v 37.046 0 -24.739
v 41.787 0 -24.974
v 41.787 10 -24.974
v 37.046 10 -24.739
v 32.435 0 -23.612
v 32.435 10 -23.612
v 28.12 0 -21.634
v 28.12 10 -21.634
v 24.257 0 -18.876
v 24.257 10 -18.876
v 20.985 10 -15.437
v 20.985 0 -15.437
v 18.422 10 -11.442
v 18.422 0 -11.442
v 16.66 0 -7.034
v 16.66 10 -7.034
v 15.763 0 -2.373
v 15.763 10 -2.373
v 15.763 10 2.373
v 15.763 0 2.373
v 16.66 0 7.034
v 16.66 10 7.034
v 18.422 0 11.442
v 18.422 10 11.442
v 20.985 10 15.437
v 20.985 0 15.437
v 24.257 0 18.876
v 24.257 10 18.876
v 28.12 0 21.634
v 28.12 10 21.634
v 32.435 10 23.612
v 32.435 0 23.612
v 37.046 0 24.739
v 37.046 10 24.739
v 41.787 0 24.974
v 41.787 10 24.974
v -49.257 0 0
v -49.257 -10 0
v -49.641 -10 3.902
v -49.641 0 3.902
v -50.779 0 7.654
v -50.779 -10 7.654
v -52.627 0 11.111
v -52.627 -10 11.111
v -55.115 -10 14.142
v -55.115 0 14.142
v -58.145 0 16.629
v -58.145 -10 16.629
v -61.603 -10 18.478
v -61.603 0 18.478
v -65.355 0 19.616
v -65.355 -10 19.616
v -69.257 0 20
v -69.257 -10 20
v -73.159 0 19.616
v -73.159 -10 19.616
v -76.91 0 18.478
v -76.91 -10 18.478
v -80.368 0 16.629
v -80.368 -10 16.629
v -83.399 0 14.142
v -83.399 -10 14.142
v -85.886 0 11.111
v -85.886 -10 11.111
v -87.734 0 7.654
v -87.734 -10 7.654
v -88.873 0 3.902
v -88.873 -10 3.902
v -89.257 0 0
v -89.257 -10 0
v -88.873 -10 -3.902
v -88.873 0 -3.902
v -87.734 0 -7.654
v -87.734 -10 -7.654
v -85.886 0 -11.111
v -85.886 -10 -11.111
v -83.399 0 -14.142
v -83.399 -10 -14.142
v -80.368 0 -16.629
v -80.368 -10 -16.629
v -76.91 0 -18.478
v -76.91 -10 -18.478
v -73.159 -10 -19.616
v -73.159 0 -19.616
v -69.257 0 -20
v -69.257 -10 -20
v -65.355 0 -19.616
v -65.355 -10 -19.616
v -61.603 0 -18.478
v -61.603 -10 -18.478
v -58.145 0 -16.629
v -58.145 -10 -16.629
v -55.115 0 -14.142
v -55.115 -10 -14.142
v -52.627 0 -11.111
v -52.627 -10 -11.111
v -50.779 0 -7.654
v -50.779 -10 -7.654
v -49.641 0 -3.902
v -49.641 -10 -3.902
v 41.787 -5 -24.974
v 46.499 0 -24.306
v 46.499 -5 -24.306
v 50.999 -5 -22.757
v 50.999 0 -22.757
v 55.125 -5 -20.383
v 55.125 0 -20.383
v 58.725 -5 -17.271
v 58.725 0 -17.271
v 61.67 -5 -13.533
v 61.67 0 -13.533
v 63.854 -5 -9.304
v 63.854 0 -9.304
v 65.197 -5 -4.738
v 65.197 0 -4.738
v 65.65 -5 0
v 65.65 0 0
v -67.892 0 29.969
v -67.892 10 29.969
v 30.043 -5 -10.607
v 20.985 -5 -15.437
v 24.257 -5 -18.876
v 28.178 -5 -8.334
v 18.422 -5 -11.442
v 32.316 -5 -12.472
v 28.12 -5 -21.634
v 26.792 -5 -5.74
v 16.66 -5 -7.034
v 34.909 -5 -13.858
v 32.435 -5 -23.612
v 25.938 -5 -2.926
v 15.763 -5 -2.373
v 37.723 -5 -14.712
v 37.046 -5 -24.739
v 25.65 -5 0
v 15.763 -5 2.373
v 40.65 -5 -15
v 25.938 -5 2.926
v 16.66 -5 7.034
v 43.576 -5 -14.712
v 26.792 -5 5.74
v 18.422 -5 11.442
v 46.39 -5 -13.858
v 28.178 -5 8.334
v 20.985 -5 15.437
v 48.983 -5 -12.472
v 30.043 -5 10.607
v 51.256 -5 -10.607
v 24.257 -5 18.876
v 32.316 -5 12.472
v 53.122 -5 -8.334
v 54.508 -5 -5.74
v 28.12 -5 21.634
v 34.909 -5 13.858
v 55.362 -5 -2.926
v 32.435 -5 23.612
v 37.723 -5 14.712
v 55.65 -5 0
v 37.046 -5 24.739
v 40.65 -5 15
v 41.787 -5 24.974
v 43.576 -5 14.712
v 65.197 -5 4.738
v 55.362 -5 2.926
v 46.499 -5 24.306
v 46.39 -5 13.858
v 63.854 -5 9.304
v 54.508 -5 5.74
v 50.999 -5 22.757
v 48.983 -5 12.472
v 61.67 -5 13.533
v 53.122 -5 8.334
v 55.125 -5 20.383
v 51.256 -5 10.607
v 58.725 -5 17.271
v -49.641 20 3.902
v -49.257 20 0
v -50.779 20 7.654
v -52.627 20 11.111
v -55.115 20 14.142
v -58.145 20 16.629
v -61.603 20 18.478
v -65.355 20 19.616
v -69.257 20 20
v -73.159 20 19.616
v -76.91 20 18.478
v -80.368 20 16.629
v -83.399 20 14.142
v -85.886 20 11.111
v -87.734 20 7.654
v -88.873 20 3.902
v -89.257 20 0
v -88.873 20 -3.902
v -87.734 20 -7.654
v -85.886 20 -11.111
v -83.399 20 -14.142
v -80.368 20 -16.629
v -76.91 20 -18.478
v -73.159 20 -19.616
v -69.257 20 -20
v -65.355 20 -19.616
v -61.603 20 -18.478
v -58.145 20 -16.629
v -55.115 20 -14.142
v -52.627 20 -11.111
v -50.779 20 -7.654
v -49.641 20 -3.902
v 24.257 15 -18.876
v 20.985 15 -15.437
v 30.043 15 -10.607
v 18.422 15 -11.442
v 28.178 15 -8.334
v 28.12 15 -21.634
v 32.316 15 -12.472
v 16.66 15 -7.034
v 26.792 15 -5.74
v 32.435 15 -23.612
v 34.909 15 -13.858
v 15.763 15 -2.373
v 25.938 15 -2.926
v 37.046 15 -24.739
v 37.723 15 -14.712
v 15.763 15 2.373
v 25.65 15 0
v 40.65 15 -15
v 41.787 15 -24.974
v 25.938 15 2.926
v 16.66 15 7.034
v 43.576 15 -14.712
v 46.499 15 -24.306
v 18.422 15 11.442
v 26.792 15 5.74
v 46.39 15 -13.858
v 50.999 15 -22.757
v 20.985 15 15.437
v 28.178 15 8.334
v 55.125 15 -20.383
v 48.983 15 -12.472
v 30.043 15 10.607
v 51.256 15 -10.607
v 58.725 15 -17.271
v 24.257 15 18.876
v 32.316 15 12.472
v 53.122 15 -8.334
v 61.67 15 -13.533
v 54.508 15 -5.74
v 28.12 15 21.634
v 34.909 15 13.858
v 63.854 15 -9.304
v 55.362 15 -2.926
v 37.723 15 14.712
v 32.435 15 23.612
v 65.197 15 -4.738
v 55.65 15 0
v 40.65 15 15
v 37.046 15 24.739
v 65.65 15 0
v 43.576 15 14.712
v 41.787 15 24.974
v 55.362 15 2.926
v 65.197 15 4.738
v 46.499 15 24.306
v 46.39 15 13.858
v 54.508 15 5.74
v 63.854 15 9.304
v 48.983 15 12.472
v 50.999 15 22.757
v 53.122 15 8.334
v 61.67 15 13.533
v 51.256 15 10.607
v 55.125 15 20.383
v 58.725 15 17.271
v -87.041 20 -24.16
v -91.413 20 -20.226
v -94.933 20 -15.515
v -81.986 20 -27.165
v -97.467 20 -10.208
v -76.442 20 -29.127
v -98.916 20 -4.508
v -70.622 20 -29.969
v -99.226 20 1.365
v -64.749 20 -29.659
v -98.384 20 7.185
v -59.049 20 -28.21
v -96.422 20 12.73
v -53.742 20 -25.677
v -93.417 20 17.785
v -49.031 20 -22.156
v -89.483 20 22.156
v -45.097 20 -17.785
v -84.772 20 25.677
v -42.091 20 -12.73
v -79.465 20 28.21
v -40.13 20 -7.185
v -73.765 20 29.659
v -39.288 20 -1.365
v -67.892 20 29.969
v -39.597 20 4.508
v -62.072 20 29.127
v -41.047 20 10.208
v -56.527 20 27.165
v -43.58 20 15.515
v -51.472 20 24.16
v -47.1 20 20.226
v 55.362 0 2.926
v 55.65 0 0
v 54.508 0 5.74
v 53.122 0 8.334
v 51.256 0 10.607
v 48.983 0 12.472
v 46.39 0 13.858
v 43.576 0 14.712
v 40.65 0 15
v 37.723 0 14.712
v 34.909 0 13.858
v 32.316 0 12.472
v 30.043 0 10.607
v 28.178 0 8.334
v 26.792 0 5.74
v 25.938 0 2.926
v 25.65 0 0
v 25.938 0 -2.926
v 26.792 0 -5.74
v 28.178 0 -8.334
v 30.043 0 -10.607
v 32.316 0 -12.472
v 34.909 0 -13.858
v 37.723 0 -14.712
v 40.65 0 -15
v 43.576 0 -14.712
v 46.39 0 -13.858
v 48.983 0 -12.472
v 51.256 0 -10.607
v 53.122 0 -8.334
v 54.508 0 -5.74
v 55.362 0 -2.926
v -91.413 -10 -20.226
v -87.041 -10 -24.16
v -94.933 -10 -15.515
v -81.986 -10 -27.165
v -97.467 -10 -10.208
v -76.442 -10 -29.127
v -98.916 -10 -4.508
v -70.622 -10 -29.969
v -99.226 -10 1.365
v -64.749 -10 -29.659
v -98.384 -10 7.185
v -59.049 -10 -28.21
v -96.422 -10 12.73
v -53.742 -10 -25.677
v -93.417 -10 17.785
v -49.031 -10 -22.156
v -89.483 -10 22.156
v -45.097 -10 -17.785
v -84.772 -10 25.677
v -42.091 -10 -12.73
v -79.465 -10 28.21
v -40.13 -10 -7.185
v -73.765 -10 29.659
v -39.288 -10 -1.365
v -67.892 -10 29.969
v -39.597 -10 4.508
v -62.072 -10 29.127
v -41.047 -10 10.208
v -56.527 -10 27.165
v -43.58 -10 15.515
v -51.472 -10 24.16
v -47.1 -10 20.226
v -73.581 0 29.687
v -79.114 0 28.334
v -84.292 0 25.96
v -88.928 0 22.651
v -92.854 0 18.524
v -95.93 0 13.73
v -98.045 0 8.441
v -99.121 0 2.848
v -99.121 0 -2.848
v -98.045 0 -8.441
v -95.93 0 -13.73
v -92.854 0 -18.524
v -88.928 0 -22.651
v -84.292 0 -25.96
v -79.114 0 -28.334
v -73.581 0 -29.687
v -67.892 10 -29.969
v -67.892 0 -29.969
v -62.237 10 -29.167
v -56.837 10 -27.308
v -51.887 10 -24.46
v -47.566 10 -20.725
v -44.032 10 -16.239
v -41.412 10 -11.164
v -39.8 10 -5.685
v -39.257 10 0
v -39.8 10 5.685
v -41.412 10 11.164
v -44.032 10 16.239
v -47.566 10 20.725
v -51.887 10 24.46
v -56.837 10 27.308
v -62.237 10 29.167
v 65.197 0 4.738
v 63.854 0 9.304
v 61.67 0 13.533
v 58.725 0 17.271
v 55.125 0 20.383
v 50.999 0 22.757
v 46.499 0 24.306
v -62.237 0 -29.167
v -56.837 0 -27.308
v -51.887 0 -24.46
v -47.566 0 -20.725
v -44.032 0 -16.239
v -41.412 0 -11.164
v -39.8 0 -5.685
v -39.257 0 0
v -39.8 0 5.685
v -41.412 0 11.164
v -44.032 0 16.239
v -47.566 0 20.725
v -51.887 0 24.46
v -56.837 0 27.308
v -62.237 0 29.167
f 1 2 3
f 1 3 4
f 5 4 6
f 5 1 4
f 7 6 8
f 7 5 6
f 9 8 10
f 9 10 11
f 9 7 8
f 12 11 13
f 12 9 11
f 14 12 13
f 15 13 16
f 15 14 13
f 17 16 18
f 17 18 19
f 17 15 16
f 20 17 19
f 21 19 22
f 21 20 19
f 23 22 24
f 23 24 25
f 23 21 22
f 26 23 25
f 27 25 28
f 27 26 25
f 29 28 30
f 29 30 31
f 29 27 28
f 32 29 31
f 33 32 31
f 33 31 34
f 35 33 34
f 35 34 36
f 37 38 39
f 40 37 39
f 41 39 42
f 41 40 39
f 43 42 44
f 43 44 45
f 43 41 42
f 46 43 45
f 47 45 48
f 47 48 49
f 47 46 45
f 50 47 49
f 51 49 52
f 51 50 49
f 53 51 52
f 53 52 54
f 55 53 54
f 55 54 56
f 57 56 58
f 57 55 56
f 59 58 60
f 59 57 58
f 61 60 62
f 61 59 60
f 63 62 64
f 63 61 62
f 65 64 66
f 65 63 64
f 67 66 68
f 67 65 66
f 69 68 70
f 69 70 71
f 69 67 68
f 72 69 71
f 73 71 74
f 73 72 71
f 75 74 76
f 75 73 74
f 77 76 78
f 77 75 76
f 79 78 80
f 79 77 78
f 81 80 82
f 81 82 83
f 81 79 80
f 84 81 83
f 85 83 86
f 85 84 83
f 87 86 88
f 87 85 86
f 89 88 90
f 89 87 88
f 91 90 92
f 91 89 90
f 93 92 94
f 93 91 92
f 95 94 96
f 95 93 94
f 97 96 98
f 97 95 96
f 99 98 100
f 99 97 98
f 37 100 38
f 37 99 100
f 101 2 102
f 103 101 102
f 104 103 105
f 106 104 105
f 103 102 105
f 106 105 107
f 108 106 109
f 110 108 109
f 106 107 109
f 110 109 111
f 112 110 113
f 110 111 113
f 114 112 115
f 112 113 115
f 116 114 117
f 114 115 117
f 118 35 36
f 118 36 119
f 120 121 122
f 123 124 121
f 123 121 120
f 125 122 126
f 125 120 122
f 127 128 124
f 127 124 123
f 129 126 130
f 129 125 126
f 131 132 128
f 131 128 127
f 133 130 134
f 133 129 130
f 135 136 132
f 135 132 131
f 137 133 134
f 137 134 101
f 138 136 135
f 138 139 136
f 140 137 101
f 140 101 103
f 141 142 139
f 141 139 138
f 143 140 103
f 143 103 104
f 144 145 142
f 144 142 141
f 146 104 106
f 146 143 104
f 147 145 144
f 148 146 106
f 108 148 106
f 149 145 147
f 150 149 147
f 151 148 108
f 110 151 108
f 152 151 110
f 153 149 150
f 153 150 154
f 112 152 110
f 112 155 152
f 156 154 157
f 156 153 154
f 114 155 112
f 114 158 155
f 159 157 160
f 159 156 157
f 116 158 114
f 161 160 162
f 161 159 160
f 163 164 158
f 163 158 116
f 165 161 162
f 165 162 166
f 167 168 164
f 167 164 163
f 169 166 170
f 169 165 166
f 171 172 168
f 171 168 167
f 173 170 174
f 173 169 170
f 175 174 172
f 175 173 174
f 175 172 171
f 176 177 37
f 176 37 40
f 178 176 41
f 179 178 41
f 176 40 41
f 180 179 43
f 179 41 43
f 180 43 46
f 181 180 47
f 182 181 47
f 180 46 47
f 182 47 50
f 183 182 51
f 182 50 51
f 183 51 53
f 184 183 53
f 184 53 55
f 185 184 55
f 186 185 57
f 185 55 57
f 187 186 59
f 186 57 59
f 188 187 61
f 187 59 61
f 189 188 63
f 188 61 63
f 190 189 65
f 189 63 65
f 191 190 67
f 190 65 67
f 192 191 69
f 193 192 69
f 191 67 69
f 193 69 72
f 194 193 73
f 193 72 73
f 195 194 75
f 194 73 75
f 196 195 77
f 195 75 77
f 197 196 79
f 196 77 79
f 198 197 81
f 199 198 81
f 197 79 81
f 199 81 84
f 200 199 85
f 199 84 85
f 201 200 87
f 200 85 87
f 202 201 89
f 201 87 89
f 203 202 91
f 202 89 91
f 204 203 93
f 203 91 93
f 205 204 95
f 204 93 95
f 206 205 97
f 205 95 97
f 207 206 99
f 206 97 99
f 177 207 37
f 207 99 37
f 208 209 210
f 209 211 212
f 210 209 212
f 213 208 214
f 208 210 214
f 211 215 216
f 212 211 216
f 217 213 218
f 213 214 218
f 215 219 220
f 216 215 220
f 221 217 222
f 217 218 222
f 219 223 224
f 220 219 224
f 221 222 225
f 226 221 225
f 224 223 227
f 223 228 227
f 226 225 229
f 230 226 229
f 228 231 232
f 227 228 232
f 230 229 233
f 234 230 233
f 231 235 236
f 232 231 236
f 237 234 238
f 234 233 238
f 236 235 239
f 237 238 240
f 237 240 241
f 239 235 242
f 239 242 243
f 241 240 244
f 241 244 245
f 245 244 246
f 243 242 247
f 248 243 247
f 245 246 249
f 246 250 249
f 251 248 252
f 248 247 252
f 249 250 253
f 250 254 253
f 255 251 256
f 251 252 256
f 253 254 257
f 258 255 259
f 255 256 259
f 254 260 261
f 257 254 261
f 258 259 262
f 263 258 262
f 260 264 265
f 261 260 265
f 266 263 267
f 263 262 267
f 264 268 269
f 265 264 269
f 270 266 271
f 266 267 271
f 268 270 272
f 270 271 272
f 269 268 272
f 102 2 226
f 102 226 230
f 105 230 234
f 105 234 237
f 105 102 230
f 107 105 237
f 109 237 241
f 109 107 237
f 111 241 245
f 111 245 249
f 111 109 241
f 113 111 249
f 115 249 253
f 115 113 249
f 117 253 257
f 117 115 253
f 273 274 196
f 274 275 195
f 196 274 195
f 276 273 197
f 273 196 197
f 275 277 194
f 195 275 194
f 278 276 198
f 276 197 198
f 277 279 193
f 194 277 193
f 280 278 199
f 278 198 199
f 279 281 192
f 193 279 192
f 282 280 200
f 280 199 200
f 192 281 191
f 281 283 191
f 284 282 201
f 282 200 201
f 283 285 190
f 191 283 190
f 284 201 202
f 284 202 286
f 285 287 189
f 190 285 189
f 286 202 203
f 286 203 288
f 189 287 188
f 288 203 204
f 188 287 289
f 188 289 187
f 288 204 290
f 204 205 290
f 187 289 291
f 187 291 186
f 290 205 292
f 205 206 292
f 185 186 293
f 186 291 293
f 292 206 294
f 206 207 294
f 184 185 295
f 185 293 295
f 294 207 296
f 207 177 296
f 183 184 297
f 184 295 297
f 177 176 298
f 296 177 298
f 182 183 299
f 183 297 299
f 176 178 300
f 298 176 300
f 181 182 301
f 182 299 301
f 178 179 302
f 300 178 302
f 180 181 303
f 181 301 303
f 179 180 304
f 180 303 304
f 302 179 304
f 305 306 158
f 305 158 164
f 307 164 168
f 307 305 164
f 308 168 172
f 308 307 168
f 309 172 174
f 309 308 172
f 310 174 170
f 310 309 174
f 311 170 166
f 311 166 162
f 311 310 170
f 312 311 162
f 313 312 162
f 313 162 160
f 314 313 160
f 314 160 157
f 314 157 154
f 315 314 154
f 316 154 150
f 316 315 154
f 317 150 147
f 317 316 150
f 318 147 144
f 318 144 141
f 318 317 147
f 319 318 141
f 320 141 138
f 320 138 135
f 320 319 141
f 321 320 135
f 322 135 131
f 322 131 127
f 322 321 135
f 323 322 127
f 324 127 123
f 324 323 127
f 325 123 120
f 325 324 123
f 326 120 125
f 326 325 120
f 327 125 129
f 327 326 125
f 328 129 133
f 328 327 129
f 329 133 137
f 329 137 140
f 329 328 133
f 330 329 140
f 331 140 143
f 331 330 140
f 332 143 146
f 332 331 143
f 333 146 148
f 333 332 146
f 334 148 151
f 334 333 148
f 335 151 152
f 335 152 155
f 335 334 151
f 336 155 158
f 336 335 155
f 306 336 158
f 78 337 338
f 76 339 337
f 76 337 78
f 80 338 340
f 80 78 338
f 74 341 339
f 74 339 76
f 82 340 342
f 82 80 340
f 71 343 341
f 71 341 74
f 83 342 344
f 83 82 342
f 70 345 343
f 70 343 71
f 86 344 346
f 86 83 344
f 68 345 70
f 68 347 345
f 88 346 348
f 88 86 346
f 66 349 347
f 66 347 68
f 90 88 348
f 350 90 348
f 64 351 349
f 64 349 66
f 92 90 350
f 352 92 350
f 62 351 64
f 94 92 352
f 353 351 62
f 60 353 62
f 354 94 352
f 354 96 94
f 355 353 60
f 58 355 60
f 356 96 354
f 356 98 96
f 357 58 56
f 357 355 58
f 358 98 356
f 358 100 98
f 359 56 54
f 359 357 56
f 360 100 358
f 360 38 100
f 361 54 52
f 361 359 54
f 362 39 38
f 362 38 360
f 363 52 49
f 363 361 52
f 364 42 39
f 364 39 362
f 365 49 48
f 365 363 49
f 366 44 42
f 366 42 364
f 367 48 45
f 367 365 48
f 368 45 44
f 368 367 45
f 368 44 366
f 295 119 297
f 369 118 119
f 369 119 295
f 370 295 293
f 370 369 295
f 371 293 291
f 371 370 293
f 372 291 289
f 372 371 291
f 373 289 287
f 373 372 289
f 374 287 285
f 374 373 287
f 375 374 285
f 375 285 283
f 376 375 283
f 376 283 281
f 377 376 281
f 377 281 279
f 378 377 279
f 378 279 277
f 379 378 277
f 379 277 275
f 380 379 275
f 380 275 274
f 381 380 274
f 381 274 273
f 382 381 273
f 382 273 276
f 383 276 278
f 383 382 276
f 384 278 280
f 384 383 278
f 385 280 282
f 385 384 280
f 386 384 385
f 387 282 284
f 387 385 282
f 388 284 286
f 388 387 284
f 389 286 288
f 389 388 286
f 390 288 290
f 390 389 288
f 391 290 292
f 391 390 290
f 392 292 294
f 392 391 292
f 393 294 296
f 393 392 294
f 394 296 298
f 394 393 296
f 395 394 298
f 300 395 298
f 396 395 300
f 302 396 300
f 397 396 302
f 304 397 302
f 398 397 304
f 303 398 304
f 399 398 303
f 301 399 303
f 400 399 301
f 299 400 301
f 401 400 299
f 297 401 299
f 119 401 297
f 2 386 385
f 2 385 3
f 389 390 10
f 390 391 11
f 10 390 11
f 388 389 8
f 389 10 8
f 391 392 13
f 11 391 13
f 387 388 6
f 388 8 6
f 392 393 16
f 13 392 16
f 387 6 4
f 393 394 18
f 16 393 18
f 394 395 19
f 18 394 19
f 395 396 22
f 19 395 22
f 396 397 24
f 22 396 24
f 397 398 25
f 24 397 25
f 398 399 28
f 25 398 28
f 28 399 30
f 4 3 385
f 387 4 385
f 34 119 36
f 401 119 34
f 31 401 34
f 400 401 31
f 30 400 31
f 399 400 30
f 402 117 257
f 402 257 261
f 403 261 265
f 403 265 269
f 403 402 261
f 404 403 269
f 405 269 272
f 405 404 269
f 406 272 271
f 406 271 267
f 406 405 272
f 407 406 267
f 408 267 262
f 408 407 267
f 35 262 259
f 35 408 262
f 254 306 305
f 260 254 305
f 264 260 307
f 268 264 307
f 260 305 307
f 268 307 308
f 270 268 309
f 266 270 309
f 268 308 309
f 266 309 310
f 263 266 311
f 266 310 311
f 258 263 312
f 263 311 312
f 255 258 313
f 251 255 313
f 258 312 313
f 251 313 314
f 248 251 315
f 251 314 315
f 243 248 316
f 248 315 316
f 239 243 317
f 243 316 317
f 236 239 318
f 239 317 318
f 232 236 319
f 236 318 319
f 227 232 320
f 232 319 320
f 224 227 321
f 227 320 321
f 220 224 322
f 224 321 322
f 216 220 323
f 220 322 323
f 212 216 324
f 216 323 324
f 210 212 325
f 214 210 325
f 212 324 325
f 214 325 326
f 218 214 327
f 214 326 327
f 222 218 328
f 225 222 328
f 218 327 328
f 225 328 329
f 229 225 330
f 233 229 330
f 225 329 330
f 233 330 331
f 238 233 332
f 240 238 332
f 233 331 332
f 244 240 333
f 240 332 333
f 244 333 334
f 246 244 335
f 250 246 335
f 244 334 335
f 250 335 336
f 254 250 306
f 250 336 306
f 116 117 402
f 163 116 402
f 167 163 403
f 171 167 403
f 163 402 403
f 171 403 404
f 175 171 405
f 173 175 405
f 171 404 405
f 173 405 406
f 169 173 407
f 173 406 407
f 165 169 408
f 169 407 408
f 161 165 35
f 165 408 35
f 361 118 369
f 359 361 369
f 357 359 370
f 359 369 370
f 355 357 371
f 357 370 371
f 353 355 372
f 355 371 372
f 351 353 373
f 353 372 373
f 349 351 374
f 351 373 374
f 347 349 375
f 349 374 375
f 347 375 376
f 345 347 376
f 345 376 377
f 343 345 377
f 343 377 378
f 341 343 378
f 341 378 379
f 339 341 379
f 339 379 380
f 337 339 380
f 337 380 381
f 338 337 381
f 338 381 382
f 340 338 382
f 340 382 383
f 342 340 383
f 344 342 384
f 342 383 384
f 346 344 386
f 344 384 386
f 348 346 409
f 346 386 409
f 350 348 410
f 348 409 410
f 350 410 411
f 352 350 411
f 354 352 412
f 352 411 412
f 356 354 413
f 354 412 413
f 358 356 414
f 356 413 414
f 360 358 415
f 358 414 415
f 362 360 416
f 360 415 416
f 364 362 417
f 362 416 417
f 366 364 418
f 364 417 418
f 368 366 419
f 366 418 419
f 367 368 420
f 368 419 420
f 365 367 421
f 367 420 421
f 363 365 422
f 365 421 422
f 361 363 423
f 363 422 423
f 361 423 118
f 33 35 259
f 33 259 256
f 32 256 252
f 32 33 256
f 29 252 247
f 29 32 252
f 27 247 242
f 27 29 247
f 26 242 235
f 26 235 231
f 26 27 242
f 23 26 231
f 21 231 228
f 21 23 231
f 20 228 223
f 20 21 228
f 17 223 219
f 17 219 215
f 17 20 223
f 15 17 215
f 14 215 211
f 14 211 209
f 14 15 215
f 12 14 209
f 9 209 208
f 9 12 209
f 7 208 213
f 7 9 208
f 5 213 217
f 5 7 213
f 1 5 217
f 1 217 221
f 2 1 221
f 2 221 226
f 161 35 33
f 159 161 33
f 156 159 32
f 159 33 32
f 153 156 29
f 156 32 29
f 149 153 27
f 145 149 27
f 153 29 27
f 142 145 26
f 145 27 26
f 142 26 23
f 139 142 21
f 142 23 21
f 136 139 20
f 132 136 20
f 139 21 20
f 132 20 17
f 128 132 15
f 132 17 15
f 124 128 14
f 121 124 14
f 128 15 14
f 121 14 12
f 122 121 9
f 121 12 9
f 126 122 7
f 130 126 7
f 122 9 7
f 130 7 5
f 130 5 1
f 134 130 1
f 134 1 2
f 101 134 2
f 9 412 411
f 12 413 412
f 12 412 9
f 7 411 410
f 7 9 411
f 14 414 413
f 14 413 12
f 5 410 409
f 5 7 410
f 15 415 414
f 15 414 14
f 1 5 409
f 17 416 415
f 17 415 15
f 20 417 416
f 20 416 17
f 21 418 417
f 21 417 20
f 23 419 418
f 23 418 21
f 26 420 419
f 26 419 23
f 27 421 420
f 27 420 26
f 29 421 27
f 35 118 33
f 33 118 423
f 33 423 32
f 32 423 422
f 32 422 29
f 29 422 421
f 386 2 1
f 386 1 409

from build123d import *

# Parameters (mm, degrees)
F1_DEPTH = 10
F0_R     = 20
F2_DEPTH = 20
F0_R_2   = 15
F3_DEPTH = 15
F4_DEPTH = 10
F5_DEPTH = 5


with BuildPart() as f1:
    # F0 (on Front) → F1 (new body)
    with BuildSketch(Plane.XZ):
        with BuildLine():
            ThreePointArc((-67.8919983579, 29.9689394462), (-47.5664292993, 20.7250586992), (-39.2567944856, 0))
            ThreePointArc((-39.2567944856, 0), (-47.5664292993, -20.7250586992), (-67.8919983579, -29.9689394462))
            Line((-67.8919983579, -29.9689394462), (41.7870608186, -24.9741162052))
            ThreePointArc((41.7870608186, -24.9741162052), (15.6497307122, 0), (41.7870608186, 24.9741162052))
            Line((41.7870608186, 24.9741162052), (-67.8919983579, 29.9689394462))
        make_face()
    extrude(amount=-F1_DEPTH)

    # F0 (on Front) → F2 (join)
    with BuildSketch(Plane.XZ):
        with BuildLine():
            ThreePointArc((-67.8919983579, -29.9689394462), (-47.5664292993, -20.7250586992), (-39.2567944856, 0))
            ThreePointArc((-39.2567944856, 0), (-47.5664292993, 20.7250586992), (-67.8919983579, 29.9689394462))
            ThreePointArc((-67.8919983579, 29.9689394462), (-99.2567944856, 0), (-67.8919983579, -29.9689394462))
        make_face()
        with Locations((-69.2567944856, 0)):
            Circle(F0_R, mode=Mode.SUBTRACT)
    extrude(amount=-F2_DEPTH)

    # F0 (on Front) → F4 (join)
    with BuildSketch(Plane.XZ):
        with BuildLine():
            ThreePointArc((-67.8919983579, -29.9689394462), (-47.5664292993, -20.7250586992), (-39.2567944856, 0))
            ThreePointArc((-39.2567944856, 0), (-47.5664292993, 20.7250586992), (-67.8919983579, 29.9689394462))
            ThreePointArc((-67.8919983579, 29.9689394462), (-99.2567944856, 0), (-67.8919983579, -29.9689394462))
        make_face()
        with Locations((-69.2567944856, 0)):
            Circle(F0_R, mode=Mode.SUBTRACT)
    extrude(amount=F4_DEPTH)


with BuildPart() as f3:
    # F0 (on Front) → F3 (new body)
    with BuildSketch(Plane.XZ):
        with BuildLine():
            ThreePointArc((65.6497307122, 0), (58.7250350341, 17.2708822493), (41.7870608186, 24.9741162052))
            ThreePointArc((41.7870608186, 24.9741162052), (15.6497307122, 0), (41.7870608186, -24.9741162052))
            ThreePointArc((41.7870608186, -24.9741162052), (58.7250350341, -17.2708822493), (65.6497307122, 0))
        make_face()
        with Locations((40.6497307122, 0)):
            Circle(F0_R_2, mode=Mode.SUBTRACT)
    extrude(amount=-F3_DEPTH)

    # F0 (on Front) → F5 (join)
    with BuildSketch(Plane.XZ):
        with BuildLine():
            ThreePointArc((65.6497307122, 0), (58.7250350341, 17.2708822493), (41.7870608186, 24.9741162052))
            ThreePointArc((41.7870608186, 24.9741162052), (15.6497307122, 0), (41.7870608186, -24.9741162052))
            ThreePointArc((41.7870608186, -24.9741162052), (58.7250350341, -17.2708822493), (65.6497307122, 0))
        make_face()
        with Locations((40.6497307122, 0)):
            Circle(F0_R_2, mode=Mode.SUBTRACT)
    extrude(amount=F5_DEPTH)


solid = Compound([f1.part, f3.part])
